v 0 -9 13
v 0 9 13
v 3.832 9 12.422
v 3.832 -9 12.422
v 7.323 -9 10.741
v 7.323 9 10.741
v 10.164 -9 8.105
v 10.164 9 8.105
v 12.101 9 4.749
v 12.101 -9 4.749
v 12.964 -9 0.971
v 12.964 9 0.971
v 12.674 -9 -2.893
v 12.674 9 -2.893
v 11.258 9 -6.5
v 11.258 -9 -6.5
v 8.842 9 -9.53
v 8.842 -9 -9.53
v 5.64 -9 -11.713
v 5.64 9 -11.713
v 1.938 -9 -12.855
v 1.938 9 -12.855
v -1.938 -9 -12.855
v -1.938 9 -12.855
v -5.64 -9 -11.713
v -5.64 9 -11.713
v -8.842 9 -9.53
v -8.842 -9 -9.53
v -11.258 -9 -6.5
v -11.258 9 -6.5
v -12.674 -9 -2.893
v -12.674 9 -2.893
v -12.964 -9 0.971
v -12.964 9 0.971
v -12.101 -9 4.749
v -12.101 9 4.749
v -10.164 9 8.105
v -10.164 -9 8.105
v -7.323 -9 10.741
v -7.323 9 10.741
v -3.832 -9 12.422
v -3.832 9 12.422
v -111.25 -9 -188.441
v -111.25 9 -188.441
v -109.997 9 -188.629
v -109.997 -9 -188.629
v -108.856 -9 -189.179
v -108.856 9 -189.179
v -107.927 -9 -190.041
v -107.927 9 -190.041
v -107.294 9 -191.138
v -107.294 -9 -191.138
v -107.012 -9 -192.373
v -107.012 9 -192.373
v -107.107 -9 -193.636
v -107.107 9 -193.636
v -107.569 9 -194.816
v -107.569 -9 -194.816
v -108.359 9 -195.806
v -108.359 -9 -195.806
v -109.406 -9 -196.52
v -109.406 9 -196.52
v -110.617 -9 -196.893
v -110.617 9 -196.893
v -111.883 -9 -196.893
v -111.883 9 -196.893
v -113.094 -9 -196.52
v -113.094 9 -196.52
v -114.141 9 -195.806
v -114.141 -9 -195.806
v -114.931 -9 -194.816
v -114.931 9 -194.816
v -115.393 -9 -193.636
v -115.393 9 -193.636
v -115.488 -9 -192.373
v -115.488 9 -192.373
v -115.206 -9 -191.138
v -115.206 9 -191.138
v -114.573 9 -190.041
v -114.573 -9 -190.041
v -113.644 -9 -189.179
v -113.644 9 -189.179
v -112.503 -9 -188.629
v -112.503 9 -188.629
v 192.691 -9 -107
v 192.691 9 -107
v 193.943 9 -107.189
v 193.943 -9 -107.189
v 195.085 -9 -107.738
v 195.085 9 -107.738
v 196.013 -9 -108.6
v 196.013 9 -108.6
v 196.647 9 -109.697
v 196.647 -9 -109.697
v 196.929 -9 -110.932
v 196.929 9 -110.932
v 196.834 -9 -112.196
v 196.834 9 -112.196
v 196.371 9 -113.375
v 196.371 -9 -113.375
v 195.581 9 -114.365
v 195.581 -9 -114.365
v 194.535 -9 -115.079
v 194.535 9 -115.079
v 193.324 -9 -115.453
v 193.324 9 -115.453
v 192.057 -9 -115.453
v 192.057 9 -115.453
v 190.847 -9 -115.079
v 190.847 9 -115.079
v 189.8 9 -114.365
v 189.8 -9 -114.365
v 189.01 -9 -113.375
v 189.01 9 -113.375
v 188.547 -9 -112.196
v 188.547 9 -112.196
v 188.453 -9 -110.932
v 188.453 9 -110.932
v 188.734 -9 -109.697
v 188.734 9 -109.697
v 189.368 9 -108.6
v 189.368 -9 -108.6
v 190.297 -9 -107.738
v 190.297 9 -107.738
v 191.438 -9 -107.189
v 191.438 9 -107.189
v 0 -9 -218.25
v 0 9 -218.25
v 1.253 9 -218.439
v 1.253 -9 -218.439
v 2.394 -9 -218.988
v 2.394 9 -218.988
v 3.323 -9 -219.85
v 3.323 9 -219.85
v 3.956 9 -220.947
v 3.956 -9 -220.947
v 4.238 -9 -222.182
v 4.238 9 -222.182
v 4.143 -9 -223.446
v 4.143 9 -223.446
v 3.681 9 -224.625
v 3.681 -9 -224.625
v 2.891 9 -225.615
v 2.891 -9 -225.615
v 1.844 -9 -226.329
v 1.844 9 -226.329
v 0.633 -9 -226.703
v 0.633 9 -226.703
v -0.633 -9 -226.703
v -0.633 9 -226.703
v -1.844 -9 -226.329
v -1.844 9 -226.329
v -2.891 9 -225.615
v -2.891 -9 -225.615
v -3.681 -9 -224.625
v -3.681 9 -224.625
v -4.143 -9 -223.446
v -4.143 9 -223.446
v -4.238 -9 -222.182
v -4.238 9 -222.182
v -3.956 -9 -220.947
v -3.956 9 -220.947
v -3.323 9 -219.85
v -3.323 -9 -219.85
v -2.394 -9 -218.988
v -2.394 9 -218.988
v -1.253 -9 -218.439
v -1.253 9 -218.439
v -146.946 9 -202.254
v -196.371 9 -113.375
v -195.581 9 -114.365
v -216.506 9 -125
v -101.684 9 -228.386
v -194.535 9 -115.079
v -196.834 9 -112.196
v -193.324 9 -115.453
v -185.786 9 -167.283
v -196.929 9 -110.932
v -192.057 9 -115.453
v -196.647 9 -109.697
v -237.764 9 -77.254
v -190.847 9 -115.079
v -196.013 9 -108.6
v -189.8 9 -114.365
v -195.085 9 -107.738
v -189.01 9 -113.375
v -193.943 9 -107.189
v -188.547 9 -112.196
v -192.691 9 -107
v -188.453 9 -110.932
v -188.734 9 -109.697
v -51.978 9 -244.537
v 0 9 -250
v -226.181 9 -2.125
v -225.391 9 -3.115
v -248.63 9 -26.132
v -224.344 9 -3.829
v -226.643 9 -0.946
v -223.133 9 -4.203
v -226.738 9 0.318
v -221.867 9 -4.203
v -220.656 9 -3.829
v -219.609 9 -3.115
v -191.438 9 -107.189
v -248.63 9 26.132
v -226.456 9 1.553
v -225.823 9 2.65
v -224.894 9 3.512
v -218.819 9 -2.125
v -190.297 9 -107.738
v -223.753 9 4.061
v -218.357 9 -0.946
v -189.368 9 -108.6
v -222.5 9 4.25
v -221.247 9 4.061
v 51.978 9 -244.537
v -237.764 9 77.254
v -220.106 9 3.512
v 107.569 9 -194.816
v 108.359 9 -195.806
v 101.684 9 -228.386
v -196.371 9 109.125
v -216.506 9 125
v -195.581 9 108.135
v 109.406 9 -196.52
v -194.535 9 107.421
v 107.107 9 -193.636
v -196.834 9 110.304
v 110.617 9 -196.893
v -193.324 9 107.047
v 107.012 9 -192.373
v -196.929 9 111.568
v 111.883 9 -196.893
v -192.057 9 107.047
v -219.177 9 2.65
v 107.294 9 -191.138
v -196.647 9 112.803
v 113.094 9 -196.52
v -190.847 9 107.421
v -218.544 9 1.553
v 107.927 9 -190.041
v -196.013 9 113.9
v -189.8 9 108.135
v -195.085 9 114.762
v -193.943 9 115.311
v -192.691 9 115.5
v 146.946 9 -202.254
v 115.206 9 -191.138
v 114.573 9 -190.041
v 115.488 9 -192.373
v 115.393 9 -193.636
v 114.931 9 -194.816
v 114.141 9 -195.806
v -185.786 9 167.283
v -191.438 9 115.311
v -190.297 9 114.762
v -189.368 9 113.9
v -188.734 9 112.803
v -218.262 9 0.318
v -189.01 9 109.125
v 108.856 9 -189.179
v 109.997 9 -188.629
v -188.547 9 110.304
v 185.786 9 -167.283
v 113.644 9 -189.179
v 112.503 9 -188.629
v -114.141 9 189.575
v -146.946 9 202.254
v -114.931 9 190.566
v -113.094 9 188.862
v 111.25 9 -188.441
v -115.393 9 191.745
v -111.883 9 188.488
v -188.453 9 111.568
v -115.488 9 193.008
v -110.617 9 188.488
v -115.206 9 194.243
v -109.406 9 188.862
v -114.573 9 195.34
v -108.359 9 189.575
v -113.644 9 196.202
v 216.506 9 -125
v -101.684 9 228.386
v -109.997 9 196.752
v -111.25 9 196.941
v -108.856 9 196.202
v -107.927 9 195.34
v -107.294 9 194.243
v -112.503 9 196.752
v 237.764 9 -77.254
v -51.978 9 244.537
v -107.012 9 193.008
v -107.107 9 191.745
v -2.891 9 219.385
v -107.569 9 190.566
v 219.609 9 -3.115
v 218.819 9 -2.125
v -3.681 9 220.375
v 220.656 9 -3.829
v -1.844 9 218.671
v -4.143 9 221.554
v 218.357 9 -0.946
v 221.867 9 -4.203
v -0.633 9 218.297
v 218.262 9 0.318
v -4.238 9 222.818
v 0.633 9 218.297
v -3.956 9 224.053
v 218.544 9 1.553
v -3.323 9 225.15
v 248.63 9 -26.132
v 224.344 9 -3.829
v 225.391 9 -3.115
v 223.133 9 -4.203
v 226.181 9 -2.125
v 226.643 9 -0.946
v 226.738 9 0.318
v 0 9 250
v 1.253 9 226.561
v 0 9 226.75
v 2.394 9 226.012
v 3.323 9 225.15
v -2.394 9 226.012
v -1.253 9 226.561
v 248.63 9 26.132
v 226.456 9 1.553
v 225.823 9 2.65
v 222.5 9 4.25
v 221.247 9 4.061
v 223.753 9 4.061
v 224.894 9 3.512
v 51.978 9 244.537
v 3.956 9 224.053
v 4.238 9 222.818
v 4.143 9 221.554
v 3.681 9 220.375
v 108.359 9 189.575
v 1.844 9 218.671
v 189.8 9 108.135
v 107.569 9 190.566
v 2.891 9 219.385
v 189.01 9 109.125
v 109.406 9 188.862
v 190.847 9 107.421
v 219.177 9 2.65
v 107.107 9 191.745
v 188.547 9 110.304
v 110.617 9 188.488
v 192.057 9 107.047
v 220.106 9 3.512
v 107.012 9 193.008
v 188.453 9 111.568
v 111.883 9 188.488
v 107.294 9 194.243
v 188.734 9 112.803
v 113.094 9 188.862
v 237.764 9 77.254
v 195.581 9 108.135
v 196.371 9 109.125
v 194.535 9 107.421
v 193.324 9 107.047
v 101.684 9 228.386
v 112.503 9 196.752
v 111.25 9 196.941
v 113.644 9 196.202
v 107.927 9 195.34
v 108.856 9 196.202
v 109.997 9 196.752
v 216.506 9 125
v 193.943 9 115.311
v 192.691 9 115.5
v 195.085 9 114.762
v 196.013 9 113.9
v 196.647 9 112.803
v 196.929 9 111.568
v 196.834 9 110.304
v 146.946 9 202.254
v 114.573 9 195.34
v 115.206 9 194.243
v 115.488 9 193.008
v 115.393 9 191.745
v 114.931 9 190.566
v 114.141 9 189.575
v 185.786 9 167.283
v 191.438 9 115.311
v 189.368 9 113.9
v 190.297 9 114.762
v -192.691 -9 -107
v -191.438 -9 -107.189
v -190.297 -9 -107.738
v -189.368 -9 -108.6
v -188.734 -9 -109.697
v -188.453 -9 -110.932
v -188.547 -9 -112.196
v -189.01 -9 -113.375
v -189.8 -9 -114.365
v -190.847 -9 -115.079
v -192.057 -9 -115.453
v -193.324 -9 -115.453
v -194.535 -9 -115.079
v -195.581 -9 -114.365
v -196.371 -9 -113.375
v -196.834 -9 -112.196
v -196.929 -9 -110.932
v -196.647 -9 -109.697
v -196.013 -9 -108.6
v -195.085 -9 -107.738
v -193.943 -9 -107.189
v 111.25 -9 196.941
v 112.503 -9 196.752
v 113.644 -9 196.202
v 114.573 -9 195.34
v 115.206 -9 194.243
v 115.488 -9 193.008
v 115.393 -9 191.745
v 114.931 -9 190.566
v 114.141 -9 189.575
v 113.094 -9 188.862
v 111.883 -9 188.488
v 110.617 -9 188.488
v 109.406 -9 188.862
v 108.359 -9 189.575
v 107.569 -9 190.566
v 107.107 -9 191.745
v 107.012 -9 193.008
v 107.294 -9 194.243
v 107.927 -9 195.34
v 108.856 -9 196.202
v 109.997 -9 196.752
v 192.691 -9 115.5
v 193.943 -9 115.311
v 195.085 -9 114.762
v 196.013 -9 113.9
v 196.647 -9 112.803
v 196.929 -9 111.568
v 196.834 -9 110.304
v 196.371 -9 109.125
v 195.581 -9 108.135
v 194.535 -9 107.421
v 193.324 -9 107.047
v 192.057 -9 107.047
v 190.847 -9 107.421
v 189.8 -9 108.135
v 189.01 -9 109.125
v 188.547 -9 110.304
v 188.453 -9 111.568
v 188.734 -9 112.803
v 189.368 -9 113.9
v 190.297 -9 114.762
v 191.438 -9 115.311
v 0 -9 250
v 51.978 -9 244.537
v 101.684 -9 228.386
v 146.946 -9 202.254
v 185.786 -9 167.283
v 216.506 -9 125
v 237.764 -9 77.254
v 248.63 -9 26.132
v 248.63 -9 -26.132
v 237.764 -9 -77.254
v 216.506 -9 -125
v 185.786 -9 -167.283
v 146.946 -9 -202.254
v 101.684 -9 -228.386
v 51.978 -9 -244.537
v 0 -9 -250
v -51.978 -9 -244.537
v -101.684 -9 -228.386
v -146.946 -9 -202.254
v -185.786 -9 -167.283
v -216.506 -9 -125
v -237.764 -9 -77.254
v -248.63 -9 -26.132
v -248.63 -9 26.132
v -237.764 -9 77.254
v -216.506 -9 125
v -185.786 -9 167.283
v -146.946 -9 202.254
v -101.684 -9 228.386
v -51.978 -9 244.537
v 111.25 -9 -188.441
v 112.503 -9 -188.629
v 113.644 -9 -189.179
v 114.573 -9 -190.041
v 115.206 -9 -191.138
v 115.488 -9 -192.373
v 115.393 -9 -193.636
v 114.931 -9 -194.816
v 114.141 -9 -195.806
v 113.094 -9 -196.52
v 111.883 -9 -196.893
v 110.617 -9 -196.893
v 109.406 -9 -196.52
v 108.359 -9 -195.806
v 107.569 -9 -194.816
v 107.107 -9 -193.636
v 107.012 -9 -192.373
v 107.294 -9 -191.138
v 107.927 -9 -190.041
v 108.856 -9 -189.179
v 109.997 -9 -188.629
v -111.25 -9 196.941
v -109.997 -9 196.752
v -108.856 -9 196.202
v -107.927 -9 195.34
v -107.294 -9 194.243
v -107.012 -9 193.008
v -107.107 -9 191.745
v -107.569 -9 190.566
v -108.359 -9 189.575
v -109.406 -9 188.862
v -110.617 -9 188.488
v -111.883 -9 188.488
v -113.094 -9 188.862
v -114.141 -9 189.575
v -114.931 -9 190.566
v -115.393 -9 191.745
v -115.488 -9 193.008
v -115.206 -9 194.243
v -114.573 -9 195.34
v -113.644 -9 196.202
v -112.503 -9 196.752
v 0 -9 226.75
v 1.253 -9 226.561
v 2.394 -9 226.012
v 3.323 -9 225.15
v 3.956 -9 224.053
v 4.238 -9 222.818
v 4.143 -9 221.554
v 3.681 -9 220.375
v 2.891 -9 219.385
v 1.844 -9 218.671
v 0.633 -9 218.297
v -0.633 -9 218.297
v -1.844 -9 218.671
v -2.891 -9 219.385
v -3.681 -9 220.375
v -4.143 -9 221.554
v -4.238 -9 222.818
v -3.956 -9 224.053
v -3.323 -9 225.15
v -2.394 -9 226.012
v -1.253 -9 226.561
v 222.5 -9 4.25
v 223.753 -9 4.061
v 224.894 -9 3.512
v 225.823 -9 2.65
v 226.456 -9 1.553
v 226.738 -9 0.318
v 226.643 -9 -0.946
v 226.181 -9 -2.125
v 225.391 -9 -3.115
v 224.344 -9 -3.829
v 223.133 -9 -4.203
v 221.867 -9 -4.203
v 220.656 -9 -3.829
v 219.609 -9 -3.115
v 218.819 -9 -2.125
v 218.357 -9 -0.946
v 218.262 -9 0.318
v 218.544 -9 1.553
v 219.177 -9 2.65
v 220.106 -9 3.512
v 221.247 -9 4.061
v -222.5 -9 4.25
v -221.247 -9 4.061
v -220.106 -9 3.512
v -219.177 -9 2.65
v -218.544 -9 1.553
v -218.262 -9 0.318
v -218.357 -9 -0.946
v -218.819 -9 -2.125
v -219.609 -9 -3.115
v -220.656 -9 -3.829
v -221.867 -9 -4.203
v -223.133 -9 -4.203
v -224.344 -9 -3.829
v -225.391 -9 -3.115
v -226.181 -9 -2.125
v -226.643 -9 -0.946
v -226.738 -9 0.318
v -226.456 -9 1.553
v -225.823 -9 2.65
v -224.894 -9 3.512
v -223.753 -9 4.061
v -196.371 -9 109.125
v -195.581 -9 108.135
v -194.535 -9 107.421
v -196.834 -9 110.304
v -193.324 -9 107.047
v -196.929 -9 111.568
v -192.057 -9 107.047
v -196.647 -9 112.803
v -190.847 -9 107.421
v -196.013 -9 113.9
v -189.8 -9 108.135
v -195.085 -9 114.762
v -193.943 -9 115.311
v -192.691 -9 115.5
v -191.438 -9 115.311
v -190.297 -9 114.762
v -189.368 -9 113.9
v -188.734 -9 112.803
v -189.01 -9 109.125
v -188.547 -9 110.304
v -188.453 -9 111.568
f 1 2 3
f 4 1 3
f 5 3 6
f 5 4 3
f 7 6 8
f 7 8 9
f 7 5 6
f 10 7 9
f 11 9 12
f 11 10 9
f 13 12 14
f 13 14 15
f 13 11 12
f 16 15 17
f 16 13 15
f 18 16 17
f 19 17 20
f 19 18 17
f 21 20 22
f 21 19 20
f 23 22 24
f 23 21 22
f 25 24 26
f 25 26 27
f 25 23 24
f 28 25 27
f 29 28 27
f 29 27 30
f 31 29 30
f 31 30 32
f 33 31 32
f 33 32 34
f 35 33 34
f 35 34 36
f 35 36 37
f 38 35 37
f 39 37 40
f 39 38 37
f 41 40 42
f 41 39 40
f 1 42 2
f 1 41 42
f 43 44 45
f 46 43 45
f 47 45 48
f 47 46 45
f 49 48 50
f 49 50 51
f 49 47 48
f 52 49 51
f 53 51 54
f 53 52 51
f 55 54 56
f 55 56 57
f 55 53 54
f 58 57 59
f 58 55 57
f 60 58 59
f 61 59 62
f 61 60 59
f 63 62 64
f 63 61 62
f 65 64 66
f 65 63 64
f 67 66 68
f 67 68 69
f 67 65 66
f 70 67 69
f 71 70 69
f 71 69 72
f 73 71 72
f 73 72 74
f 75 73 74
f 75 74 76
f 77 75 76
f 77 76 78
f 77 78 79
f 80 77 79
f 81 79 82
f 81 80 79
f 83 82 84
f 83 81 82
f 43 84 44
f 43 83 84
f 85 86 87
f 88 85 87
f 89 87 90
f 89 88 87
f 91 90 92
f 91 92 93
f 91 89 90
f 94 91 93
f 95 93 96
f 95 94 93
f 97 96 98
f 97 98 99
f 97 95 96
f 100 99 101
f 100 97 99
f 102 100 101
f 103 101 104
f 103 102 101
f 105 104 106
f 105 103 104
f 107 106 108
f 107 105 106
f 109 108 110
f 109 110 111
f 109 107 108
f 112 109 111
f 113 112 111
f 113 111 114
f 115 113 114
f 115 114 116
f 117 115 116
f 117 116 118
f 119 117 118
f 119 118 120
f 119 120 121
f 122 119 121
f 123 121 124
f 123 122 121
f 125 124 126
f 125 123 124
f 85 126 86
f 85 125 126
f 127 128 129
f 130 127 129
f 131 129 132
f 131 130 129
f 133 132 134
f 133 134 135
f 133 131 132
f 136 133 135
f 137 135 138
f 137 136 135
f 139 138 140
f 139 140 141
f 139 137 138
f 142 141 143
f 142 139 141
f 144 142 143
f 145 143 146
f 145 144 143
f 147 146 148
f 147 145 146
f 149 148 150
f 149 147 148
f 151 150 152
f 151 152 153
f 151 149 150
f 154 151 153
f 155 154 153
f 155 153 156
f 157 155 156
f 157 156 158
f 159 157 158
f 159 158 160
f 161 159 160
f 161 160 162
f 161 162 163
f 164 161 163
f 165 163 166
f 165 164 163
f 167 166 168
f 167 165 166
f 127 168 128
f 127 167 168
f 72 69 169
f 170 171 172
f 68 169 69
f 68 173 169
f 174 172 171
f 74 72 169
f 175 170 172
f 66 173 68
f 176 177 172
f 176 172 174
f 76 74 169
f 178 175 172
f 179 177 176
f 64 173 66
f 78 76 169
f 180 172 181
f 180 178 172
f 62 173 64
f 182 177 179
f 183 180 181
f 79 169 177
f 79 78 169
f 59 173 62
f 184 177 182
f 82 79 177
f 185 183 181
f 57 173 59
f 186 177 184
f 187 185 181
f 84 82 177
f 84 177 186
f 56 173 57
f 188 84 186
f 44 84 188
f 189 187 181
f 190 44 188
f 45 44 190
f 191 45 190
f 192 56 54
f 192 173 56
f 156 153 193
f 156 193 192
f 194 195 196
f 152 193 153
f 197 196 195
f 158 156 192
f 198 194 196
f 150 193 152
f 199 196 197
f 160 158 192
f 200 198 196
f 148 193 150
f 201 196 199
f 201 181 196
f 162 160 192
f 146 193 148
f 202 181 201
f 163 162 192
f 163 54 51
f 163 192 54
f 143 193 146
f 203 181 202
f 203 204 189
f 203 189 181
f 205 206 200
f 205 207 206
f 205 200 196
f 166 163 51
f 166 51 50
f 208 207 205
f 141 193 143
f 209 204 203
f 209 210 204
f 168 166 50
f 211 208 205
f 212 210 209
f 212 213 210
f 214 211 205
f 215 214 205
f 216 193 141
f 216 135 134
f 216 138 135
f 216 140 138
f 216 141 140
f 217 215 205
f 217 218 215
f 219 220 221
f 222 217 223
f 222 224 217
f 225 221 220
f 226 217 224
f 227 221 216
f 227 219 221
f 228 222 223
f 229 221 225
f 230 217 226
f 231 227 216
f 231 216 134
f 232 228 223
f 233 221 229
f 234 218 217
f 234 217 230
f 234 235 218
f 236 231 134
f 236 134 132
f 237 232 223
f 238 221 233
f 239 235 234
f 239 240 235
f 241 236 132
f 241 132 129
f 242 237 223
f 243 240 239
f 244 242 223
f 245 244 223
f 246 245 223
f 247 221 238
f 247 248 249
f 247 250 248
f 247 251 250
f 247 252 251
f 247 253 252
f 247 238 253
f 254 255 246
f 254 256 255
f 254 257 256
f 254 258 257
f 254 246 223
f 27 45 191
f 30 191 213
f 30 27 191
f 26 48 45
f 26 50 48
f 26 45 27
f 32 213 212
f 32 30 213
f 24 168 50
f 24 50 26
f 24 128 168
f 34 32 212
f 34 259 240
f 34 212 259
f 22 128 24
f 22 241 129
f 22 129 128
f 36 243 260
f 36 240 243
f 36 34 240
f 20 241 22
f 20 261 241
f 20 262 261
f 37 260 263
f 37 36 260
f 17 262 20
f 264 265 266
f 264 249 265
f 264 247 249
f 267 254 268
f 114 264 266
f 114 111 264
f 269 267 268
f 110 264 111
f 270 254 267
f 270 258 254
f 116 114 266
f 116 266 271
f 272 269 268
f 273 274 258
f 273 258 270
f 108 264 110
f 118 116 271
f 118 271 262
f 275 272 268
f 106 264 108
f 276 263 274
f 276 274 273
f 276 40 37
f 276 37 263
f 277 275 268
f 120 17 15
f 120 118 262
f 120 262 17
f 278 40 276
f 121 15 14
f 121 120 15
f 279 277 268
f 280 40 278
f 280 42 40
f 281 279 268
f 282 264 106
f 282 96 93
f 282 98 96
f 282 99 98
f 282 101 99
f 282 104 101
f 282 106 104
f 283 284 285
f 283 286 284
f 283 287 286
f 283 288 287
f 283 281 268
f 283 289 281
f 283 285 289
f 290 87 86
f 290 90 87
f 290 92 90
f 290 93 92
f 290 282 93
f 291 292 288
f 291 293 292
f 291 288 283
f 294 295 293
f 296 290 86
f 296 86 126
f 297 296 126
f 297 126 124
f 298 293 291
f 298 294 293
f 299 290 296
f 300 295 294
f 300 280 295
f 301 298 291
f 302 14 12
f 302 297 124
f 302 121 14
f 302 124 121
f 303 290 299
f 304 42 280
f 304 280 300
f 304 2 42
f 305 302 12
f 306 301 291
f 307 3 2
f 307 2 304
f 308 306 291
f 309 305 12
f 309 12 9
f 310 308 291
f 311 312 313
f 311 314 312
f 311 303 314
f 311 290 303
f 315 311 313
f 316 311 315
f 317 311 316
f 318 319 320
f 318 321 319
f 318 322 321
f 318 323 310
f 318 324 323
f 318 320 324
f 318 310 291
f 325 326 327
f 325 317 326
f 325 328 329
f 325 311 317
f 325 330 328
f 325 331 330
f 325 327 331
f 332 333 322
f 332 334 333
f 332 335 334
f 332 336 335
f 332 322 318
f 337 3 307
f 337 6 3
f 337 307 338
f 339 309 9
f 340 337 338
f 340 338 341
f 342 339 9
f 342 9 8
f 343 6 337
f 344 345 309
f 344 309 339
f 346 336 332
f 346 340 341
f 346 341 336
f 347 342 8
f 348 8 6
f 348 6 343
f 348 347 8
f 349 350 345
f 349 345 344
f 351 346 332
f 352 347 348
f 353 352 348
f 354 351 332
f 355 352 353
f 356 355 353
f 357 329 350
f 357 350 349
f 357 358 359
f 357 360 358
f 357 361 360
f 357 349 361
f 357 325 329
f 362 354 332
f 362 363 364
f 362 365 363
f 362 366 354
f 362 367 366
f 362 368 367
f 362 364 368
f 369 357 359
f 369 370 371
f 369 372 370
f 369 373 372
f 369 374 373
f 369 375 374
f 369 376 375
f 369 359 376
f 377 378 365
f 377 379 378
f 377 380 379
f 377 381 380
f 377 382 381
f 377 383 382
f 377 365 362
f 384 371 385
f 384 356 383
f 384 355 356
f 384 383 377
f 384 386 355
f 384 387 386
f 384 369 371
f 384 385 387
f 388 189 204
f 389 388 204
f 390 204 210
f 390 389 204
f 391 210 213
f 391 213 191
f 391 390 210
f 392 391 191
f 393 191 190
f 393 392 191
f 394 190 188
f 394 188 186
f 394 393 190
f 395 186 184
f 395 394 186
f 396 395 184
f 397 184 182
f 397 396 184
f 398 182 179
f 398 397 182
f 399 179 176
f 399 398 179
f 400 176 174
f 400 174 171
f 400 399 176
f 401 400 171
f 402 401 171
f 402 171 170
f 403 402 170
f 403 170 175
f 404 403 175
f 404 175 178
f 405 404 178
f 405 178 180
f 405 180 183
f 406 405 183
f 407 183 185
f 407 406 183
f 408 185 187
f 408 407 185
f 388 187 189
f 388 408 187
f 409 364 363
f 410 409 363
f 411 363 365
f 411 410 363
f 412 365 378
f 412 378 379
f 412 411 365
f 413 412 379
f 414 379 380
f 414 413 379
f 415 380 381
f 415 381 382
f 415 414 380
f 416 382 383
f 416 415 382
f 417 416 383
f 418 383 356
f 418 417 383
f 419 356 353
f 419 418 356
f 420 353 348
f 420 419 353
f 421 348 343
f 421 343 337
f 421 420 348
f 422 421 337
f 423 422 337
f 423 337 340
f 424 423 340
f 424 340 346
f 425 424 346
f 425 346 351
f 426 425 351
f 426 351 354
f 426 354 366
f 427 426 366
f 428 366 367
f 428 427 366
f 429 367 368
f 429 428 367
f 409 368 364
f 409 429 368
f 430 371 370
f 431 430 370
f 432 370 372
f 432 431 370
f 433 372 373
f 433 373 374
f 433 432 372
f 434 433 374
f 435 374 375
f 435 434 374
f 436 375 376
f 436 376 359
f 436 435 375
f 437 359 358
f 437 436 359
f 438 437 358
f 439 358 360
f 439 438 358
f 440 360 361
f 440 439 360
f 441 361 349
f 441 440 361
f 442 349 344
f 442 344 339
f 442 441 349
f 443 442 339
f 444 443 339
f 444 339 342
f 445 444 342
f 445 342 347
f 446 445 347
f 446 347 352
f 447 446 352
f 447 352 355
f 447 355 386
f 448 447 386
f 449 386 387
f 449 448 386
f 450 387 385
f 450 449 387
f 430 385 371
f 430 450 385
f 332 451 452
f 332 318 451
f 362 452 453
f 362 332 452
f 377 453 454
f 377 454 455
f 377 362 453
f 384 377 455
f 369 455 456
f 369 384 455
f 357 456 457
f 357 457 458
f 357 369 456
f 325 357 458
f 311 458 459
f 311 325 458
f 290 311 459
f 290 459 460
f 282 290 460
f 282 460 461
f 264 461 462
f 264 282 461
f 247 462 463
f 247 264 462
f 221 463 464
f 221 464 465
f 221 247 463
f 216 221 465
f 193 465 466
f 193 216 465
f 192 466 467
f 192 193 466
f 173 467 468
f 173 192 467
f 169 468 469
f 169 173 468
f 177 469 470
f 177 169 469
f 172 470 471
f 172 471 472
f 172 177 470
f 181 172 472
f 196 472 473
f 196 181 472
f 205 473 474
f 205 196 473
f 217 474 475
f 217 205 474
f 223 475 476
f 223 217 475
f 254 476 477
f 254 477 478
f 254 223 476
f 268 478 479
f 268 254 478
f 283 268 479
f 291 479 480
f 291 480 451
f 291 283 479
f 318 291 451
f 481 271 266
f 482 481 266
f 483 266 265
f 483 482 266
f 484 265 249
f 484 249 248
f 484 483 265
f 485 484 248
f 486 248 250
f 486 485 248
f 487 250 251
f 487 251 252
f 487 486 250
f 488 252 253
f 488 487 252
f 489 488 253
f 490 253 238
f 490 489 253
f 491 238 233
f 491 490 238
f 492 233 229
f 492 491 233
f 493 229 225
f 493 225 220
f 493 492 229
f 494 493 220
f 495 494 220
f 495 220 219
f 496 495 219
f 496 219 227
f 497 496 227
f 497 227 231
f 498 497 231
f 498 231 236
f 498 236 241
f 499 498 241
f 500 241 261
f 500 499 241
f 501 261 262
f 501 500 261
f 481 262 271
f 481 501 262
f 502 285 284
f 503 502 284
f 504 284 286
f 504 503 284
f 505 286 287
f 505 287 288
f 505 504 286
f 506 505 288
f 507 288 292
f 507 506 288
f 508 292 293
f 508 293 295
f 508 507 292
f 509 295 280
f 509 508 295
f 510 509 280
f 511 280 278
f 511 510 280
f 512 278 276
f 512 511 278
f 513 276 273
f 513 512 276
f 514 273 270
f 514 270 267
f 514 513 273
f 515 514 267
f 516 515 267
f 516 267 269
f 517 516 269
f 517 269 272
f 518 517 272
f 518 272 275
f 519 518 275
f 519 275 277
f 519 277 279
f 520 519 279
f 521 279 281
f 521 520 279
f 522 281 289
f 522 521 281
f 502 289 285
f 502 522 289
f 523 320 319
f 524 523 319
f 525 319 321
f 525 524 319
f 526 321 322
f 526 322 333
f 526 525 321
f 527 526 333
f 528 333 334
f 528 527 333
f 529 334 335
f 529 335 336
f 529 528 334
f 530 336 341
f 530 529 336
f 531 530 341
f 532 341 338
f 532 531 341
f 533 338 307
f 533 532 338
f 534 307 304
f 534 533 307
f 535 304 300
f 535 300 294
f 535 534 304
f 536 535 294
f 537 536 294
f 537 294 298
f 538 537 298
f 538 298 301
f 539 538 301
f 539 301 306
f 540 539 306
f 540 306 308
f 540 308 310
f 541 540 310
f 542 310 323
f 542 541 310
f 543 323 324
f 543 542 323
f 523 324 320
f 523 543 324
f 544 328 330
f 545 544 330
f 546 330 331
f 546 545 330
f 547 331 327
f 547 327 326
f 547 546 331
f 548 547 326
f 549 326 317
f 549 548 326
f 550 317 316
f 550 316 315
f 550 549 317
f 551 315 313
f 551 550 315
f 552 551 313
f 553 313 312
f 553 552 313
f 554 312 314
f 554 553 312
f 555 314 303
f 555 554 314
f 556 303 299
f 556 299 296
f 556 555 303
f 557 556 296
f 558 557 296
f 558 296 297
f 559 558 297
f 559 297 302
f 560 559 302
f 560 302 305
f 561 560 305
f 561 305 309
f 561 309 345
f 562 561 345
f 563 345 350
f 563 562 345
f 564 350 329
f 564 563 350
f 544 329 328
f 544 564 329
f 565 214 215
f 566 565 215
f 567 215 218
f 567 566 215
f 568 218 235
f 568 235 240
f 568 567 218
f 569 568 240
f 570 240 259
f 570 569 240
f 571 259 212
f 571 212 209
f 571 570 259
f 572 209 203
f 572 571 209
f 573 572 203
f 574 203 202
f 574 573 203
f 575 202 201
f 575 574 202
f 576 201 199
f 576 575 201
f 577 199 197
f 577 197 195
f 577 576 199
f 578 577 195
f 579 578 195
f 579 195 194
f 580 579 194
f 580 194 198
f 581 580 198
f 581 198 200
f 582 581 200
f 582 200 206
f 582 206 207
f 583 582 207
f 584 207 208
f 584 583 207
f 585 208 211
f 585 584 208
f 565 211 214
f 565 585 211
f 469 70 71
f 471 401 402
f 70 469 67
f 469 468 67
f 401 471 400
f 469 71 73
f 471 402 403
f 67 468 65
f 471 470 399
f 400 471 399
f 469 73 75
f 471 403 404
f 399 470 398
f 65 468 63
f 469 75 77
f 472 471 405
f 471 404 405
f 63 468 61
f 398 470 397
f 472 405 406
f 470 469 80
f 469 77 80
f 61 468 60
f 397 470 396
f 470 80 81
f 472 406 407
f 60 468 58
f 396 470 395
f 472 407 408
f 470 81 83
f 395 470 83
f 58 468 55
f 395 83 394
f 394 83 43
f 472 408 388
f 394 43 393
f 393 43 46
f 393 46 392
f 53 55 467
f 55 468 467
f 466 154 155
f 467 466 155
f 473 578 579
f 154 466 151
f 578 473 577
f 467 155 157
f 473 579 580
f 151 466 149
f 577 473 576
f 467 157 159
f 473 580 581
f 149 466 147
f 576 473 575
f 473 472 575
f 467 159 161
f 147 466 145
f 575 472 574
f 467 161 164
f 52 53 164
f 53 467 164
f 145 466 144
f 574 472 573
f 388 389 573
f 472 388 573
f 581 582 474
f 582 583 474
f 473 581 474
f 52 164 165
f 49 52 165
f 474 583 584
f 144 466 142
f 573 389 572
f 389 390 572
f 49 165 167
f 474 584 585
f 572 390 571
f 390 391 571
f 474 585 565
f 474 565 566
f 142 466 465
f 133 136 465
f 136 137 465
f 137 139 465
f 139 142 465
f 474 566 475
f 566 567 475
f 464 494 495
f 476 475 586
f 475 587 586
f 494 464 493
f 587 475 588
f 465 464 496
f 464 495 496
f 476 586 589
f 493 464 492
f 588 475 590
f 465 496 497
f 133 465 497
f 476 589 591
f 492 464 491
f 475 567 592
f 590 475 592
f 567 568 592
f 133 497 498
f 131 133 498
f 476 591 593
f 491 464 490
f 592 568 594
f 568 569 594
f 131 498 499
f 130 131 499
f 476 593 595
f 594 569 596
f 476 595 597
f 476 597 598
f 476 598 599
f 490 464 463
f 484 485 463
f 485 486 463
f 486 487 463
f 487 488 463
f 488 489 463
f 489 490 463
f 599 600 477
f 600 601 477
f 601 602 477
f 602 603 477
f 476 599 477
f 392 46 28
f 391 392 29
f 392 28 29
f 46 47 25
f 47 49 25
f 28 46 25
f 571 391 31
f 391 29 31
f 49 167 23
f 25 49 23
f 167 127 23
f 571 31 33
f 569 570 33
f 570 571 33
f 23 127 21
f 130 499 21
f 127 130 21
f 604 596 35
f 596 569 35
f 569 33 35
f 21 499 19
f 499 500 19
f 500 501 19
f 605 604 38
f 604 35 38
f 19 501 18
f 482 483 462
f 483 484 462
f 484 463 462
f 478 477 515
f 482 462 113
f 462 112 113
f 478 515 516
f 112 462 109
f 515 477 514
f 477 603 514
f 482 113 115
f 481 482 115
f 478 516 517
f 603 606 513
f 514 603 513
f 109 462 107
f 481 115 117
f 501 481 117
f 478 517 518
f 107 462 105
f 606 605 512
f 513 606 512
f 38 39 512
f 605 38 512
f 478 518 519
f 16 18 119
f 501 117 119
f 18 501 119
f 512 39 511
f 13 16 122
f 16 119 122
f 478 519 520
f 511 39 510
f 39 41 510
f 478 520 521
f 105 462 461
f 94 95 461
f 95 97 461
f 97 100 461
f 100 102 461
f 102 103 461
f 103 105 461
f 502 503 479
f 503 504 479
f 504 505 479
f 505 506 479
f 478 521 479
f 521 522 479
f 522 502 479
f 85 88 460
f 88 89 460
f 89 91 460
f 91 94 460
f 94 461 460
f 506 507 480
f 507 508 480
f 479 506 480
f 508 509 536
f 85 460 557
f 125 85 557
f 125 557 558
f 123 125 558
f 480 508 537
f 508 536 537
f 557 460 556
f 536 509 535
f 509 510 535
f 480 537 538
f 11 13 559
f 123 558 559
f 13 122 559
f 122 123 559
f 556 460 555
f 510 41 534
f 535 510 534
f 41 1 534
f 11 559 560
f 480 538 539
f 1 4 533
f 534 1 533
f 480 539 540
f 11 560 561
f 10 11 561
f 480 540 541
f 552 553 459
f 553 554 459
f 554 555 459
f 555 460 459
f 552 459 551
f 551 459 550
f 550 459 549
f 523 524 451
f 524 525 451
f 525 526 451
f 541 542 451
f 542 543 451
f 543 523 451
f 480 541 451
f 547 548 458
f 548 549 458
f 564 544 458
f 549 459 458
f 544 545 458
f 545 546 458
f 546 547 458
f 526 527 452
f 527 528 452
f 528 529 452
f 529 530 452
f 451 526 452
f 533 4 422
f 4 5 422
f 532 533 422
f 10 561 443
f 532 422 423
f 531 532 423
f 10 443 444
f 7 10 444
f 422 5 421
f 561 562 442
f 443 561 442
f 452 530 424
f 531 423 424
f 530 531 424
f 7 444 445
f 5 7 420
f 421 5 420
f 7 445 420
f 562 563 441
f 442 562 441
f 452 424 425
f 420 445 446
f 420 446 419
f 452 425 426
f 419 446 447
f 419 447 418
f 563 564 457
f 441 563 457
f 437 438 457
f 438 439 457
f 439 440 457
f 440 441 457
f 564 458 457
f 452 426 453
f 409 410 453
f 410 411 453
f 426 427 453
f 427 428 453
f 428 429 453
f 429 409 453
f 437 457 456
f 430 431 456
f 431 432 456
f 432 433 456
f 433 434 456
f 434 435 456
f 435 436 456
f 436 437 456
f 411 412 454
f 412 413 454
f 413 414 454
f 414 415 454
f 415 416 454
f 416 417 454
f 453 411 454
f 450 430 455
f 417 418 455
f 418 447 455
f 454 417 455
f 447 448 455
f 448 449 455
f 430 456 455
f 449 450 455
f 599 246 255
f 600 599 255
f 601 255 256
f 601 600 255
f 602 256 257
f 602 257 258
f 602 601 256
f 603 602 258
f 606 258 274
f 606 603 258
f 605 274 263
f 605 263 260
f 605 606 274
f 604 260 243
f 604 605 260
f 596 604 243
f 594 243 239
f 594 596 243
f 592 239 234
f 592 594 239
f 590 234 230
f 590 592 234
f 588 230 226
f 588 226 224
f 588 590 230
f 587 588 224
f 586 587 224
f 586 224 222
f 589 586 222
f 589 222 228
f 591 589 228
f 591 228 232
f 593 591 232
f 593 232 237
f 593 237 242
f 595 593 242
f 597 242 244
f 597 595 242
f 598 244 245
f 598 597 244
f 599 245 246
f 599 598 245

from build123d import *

# Parameters (mm, degrees)
SKETCH1_R           = 250
SKETCH1_R_2         = 4.25
SKETCH1_R_3         = 13
BOSS_EXTRUDE1_DEPTH = 9


with BuildPart() as part:
    # Sketch1 → Boss-Extrude1 (new, symmetric)
    with BuildSketch(Plane(origin=(0, 0, 0), x_dir=(1, 0, 0), z_dir=(0, 1, 0))):
        with Locations(Location((0, 0, 0), (0, 0, 270))):
            Circle(SKETCH1_R)
        with Locations(Location((0, 222.5, 0), (0, 0, 270))):
            Circle(SKETCH1_R_2, mode=Mode.SUBTRACT)
        with Locations(Location((111.25, 192.690652342, 0), (0, 0, 270))):
            Circle(SKETCH1_R_2, mode=Mode.SUBTRACT)
        with Locations(Location((192.690652342, 111.25, 0), (0, 0, 270))):
            Circle(SKETCH1_R_2, mode=Mode.SUBTRACT)
        with Locations(Location((222.5, 0, 0), (0, 0, 270))):
            Circle(SKETCH1_R_2, mode=Mode.SUBTRACT)
        with Locations(Location((192.690652342, -111.25, 0), (0, 0, 270))):
            Circle(SKETCH1_R_2, mode=Mode.SUBTRACT)
        with Locations(Location((111.25, -192.690652342, 0), (0, 0, 270))):
            Circle(SKETCH1_R_2, mode=Mode.SUBTRACT)
        with Locations(Location((0, 0, 0), (0, 0, 270))):
            Circle(SKETCH1_R_3, mode=Mode.SUBTRACT)
        with Locations(Location((0, -222.5, 0), (0, 0, 270))):
            Circle(SKETCH1_R_2, mode=Mode.SUBTRACT)
        with Locations(Location((-111.25, -192.690652342, 0), (0, 0, 270))):
            Circle(SKETCH1_R_2, mode=Mode.SUBTRACT)
        with Locations(Location((-192.690652342, -111.25, 0), (0, 0, 270))):
            Circle(SKETCH1_R_2, mode=Mode.SUBTRACT)
        with Locations(Location((-222.5, 0, 0), (0, 0, 270))):
            Circle(SKETCH1_R_2, mode=Mode.SUBTRACT)
        with Locations(Location((-192.690652342, 111.25, 0), (0, 0, 270))):
            Circle(SKETCH1_R_2, mode=Mode.SUBTRACT)
        with Locations(Location((-111.25, 192.690652342, 0), (0, 0, 270))):
            Circle(SKETCH1_R_2, mode=Mode.SUBTRACT)
    extrude(amount=BOSS_EXTRUDE1_DEPTH, both=True)


solid = part.part
